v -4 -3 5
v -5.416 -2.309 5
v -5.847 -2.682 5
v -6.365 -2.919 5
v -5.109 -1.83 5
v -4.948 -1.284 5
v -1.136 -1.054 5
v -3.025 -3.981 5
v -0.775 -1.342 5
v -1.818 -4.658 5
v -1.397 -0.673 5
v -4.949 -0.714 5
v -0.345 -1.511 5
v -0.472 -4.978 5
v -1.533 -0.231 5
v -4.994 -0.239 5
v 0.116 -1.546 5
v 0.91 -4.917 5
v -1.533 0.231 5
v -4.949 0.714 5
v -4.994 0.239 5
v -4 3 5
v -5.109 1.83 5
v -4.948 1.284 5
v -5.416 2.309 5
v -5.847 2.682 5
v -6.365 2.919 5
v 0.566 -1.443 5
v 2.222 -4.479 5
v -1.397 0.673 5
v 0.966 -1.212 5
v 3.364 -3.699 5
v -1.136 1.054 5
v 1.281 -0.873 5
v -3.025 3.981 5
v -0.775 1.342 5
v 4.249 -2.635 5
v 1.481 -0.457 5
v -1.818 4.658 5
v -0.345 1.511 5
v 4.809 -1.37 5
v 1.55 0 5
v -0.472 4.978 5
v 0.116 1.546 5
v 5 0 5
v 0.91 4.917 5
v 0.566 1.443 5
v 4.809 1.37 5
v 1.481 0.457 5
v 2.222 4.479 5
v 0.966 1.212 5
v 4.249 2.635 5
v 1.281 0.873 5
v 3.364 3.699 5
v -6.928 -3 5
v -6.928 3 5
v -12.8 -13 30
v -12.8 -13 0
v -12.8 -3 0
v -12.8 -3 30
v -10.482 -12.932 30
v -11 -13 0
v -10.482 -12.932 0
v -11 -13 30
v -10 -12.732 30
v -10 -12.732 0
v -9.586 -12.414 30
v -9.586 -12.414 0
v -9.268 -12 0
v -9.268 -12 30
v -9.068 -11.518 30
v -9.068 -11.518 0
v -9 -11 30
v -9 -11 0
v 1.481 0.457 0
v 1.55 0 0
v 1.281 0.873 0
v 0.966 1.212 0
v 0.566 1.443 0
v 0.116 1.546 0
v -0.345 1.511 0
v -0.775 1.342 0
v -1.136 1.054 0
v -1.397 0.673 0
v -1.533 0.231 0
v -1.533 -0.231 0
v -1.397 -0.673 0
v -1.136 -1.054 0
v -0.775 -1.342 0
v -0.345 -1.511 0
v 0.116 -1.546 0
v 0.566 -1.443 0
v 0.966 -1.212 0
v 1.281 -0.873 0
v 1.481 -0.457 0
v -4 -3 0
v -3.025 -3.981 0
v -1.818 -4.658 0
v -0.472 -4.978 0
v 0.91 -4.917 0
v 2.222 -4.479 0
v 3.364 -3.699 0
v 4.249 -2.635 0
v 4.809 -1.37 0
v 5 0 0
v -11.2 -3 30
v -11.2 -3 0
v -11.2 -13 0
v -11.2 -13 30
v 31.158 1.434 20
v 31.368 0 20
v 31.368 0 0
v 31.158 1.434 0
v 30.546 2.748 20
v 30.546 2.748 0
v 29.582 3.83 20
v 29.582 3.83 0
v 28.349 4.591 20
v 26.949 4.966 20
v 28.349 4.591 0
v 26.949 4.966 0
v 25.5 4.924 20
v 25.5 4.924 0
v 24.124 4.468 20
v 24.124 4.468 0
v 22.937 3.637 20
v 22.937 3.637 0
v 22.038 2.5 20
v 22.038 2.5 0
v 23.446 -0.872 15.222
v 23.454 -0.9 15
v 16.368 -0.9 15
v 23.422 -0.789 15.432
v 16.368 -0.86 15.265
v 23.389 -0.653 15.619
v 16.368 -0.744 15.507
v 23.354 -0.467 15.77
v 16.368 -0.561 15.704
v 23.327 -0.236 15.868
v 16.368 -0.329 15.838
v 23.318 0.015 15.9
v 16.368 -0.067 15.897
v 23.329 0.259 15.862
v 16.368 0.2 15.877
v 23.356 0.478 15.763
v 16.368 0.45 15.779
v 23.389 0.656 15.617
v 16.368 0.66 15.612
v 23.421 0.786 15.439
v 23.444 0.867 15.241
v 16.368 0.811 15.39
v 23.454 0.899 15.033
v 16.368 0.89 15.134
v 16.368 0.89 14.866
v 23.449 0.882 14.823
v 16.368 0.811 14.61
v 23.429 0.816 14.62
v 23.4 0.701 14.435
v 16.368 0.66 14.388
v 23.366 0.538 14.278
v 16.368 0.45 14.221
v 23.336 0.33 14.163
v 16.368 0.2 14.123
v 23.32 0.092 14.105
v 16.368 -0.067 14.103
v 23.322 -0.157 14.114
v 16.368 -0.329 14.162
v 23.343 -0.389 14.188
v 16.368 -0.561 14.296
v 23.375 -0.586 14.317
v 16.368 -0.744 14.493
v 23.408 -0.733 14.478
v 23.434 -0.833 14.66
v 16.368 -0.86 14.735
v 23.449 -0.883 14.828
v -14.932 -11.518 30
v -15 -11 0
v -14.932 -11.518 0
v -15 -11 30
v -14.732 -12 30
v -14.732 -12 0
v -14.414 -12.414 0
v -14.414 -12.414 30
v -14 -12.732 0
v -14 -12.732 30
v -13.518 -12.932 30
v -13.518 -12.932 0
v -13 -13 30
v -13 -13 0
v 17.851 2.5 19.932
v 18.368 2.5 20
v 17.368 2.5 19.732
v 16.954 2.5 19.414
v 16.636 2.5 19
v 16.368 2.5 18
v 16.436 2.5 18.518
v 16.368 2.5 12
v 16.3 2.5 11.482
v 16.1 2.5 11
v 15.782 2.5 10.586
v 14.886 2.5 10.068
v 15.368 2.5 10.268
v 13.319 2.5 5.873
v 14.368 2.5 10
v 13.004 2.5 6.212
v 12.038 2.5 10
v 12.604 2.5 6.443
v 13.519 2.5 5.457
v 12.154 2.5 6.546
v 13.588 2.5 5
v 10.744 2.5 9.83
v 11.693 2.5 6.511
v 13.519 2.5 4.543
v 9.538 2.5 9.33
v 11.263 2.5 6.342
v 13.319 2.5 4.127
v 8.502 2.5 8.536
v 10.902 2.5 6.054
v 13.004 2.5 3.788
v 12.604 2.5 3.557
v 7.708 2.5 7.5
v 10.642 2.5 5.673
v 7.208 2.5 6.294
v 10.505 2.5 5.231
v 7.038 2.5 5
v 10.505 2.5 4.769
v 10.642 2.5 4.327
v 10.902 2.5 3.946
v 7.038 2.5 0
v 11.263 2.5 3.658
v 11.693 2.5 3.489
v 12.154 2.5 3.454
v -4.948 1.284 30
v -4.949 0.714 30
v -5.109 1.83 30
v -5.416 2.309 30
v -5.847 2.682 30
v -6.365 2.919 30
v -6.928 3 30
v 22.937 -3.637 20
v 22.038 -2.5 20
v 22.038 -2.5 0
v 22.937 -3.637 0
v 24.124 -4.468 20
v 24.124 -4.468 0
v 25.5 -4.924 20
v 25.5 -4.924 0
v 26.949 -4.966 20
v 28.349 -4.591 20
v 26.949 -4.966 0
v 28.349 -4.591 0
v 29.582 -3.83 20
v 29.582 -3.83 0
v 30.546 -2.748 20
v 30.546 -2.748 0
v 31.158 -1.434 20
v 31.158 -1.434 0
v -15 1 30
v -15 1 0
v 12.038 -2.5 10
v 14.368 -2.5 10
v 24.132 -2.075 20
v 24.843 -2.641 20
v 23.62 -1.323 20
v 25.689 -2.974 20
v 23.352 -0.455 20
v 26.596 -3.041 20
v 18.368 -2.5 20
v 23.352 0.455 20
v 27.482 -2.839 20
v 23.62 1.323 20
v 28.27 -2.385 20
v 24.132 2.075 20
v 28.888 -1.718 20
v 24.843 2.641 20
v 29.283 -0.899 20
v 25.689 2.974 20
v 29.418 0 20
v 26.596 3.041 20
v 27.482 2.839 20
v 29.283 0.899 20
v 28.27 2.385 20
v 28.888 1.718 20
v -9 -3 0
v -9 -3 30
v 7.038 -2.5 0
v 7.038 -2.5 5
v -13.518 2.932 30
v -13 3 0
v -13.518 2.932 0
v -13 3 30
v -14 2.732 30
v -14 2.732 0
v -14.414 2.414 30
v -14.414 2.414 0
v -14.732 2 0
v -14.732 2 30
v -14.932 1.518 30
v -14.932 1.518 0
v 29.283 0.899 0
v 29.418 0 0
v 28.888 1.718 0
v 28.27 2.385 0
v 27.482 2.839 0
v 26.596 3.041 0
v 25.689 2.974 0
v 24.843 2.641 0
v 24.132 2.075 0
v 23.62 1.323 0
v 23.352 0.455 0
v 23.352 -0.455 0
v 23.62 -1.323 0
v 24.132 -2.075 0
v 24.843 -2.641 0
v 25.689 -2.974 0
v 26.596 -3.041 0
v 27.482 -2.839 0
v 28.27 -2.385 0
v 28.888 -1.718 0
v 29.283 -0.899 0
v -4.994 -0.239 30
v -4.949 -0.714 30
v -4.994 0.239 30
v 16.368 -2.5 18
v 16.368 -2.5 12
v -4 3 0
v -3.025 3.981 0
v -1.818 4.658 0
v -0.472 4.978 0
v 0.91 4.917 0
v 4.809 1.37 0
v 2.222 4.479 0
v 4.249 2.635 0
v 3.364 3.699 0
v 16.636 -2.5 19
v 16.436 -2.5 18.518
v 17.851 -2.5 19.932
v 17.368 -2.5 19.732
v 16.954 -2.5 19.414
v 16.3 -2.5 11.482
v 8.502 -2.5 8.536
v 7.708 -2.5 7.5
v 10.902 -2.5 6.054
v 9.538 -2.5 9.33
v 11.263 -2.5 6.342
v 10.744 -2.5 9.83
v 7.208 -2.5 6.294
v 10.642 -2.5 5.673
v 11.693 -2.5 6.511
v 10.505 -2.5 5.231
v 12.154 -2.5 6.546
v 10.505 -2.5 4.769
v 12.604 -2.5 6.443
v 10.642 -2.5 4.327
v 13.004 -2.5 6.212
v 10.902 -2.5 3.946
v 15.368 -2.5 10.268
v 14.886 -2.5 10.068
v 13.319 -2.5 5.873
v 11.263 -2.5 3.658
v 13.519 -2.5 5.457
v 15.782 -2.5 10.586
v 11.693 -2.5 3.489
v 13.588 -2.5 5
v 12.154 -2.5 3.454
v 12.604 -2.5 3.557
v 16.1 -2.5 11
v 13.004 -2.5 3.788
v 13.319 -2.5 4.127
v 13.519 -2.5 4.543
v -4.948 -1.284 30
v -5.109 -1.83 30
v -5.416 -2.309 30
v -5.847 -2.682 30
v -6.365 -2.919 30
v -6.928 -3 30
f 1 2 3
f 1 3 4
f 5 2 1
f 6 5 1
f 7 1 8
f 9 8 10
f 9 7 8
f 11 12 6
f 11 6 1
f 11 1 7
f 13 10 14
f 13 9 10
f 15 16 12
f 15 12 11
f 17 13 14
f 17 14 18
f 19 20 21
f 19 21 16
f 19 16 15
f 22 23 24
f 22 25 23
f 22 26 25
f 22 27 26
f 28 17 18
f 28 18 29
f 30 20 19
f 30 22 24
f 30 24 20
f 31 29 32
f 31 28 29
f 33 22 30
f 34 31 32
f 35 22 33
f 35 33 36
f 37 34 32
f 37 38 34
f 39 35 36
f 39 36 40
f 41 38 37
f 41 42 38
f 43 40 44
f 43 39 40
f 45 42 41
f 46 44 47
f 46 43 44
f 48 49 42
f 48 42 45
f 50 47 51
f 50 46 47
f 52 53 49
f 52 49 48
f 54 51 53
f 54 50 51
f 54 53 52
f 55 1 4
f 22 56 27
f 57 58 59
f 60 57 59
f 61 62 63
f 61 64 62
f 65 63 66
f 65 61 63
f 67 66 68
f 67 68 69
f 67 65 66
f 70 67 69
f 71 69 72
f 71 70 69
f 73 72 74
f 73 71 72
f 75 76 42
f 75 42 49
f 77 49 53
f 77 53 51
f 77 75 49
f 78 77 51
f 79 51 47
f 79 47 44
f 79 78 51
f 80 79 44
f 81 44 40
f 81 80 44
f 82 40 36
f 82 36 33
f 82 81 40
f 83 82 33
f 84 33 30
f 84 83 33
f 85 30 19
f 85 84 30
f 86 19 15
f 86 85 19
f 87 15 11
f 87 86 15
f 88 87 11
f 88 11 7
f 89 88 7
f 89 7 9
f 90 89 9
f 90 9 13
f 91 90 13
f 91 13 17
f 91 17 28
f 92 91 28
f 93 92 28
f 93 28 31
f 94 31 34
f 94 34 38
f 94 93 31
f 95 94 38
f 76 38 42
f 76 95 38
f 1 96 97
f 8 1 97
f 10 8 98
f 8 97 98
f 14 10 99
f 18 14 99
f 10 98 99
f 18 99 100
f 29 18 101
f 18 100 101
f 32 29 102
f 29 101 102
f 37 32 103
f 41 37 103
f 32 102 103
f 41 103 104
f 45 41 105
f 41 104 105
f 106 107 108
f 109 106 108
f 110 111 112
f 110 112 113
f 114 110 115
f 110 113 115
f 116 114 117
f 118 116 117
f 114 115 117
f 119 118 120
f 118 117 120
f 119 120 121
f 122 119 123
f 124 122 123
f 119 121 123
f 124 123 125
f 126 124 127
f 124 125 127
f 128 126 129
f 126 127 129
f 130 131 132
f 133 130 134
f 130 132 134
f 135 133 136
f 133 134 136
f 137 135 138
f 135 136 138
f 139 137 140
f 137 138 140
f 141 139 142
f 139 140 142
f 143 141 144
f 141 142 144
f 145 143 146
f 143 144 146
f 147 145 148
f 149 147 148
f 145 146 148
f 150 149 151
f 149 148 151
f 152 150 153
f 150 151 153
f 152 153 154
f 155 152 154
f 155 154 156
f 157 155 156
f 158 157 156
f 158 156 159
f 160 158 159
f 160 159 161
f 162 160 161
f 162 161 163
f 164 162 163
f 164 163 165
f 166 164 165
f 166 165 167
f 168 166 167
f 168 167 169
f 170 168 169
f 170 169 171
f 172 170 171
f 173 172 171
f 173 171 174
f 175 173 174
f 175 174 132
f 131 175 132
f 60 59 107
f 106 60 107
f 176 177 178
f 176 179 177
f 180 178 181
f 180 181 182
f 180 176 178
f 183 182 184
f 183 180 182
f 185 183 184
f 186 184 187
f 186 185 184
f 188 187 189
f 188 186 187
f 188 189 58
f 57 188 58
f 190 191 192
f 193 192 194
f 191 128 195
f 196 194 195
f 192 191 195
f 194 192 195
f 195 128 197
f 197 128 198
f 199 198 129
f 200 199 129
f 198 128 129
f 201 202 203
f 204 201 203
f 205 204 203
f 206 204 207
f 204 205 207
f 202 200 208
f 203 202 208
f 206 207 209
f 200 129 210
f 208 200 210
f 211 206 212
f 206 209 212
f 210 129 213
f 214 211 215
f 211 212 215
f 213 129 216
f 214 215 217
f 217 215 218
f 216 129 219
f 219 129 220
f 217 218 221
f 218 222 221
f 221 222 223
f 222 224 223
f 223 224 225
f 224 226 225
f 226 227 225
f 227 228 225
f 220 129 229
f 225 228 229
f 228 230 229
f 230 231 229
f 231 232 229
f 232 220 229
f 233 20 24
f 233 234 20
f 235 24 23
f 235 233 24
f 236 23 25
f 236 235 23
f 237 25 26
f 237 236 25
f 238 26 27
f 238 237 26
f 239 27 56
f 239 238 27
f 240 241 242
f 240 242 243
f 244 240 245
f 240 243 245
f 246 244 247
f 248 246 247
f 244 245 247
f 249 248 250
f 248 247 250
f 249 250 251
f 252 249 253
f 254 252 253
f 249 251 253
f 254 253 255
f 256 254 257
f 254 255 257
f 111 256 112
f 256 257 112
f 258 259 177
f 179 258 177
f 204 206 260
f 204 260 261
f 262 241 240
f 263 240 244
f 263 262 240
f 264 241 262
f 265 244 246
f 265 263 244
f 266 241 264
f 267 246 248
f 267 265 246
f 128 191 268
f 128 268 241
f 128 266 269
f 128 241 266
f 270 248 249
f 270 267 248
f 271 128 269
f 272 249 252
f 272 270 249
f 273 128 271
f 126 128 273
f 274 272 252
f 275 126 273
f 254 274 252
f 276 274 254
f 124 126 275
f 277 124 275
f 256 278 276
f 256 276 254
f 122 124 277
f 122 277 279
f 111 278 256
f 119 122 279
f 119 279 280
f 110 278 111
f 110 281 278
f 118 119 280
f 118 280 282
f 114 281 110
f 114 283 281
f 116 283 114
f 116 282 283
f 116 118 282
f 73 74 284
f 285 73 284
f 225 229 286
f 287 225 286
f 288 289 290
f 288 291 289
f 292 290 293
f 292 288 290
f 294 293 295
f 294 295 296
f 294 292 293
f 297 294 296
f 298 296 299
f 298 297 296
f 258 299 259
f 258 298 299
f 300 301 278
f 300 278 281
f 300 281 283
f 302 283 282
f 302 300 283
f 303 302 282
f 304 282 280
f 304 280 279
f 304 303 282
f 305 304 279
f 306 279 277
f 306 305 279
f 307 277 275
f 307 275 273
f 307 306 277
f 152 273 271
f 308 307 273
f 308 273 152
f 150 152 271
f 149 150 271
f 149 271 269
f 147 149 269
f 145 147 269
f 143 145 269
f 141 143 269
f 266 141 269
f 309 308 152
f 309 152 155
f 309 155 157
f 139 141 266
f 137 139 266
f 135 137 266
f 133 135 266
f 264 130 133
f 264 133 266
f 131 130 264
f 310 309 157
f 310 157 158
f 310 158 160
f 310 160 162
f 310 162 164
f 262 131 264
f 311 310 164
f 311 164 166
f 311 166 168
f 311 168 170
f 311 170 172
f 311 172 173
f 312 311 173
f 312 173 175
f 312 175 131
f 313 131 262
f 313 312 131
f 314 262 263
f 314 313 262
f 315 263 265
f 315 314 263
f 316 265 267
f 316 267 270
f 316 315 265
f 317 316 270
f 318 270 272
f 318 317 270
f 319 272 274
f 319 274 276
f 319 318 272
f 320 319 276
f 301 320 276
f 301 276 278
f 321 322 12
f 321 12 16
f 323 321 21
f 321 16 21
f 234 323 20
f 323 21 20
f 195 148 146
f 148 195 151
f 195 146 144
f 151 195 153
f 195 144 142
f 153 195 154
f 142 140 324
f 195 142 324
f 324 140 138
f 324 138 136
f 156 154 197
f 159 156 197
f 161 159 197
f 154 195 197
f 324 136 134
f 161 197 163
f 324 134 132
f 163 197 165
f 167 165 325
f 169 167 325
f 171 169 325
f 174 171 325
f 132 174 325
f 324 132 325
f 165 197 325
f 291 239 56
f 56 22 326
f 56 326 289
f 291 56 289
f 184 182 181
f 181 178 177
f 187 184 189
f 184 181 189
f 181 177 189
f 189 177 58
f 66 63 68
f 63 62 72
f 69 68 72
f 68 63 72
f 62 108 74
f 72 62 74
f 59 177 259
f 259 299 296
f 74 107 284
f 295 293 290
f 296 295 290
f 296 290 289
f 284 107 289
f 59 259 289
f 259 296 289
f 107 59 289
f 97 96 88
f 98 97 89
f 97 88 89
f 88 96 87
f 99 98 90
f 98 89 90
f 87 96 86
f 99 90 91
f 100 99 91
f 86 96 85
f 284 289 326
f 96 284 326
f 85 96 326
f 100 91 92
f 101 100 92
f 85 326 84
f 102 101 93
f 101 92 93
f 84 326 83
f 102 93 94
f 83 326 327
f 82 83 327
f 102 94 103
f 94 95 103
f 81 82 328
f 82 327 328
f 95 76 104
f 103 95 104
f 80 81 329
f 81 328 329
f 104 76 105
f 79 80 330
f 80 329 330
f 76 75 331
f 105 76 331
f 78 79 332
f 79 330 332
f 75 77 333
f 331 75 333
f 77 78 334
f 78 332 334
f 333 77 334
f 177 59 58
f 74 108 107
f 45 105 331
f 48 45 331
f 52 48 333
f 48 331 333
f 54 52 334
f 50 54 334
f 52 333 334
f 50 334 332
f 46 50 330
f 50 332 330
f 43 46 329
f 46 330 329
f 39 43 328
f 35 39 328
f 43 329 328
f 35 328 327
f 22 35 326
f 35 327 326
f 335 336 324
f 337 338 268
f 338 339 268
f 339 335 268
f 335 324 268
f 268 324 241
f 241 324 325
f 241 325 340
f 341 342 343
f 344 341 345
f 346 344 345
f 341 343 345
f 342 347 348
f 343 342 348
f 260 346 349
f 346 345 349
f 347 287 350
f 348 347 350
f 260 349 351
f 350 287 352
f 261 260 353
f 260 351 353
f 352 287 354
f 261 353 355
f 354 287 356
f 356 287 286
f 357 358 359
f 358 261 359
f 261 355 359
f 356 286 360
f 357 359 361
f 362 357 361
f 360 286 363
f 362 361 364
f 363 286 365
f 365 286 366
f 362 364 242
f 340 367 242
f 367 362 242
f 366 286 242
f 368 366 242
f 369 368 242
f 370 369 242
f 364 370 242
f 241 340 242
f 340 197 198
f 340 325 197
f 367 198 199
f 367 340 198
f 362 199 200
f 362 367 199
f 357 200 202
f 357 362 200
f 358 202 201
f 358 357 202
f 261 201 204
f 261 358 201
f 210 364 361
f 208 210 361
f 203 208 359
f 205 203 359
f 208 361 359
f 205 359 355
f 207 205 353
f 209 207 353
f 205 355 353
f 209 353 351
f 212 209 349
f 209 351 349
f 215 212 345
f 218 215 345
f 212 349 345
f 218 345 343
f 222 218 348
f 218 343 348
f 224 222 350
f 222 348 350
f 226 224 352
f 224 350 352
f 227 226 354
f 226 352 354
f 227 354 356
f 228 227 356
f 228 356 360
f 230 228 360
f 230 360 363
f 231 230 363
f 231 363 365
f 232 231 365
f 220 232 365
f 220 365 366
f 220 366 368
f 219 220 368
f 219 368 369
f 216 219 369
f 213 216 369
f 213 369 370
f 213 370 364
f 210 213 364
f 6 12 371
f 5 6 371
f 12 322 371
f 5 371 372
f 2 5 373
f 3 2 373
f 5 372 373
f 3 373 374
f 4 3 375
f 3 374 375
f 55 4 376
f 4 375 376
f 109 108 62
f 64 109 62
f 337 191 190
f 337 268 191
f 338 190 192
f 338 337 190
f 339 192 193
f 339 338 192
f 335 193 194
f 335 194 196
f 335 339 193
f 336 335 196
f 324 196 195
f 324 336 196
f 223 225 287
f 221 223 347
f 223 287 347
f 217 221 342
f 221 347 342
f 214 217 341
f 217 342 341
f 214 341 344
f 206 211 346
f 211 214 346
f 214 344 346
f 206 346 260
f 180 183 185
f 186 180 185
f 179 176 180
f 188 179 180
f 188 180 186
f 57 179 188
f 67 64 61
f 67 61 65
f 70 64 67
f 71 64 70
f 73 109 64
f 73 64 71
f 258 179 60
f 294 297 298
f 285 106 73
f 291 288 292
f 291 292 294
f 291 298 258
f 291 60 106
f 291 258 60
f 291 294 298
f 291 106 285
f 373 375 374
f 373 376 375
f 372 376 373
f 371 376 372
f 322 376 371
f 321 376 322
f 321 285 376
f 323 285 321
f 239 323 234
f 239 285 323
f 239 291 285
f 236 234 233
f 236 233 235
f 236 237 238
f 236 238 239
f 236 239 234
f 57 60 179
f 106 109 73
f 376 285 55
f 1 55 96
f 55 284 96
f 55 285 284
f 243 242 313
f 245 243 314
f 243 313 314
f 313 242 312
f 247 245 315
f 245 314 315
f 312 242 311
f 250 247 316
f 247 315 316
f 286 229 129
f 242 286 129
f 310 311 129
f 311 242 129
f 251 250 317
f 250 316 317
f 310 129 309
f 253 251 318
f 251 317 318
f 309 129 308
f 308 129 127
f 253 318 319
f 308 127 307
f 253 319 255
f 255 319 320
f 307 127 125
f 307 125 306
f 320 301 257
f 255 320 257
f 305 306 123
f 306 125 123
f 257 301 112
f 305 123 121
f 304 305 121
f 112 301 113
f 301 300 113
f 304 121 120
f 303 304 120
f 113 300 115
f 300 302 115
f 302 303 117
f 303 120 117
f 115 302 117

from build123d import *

# Parameters (mm, degrees)
F0_R      = 1.55
F1_DEPTH  = 5
F2_DEPTH  = 30
F3_R      = 2
F4_R      = 3.05
F5_DEPTH  = 20
F6_DEPTH  = 10
F7_R      = 1.55
F8_DEPTH  = 25
F10_DEPTH = 10
F11_R     = 0.9
F12_DEPTH = 10
F13_R     = 2


with BuildPart() as f1:
    # F0 (on Top) → F1 (new body)
    with BuildSketch(Plane.XY):
        with BuildLine():
            ThreePointArc((-4, -3), (1.5811388301, -4.7434164903), (5, 0))
            ThreePointArc((5, 0), (1.5811388301, 4.7434164903), (-4, 3))
            ThreePointArc((-4, 3), (-5, 0), (-4, -3))
        make_face()
        Circle(F0_R, mode=Mode.SUBTRACT)
    extrude(amount=F1_DEPTH)

    # F0 (on Top) → F2 (join)
    with BuildSketch(Plane.XY):
        with BuildLine():
            ThreePointArc((-4, -3), (-5, 0), (-4, 3))
            Line((-4, 3), (-15, 3))
            Line((-15, 3), (-15, -13))
            Line((-15, -13), (-12.8, -13))
            Line((-12.8, -13), (-12.8, -3))
            Line((-12.8, -3), (-11.2, -3))
            Line((-11.2, -3), (-11.2, -13))
            Line((-11.2, -13), (-9, -13))
            Line((-9, -13), (-9, -3))
            Line((-9, -3), (-4, -3))
        make_face()
    extrude(amount=F2_DEPTH)

    # F3
    f3_edges = [f1.edges().sort_by_distance(p)[0] for p in [
        (-4, 3, 17.5),
        (-4, -3, 17.5),
        (-15, 3, 15),
        (-9, -13, 15),
        (-15, -13, 15),
    ]]
    fillet(f3_edges, radius=F3_R)


with BuildPart() as f5:
    # F4 (on Top) → F5 (new body)
    with BuildSketch(Plane.XY):
        with BuildLine():
            ThreePointArc((22.0380171016, -2.5), (27.662239346, -4.8296291314), (31.3681441205, 0))
            ThreePointArc((31.3681441205, 0), (27.662239346, 4.8296291314), (22.0380171016, 2.5))
            ThreePointArc((22.0380171016, 2.5), (21.3681441205, 0), (22.0380171016, -2.5))
        make_face()
        with Locations((26.3681441205, 0)):
            Circle(F4_R, mode=Mode.SUBTRACT)
    extrude(amount=F5_DEPTH)

    # F4 (on Top) → F6 (join)
    with BuildSketch(Plane.XY):
        with BuildLine():
            ThreePointArc((22.0380171016, -2.5), (21.3681441205, 0), (22.0380171016, 2.5))
            Line((22.0380171016, 2.5), (7.0380171016, 2.5))
            Line((7.0380171016, 2.5), (7.0380171016, -2.5))
            Line((7.0380171016, -2.5), (22.0380171016, -2.5))
        make_face()
    extrude(amount=F6_DEPTH)

    # F7 (on face) → F8 (cut)
    with BuildSketch(Plane.XZ.offset(2.5)):
        with BuildLine():
            ThreePointArc((7.0380171016, 5), (8.5024831957, 8.5355339059), (12.0380171016, 10))
            Line((12.0380171016, 10), (7.0380171016, 10))
            Line((7.0380171016, 10), (7.0380171016, 5))
        make_face()
        with Locations((12.0380171016, 5)):
            Circle(F7_R)
    extrude(amount=-F8_DEPTH, mode=Mode.SUBTRACT)

    # F9 (on face) → F10 (join)
    with BuildSketch(Plane.XY.offset(10)):
        with BuildLine():
            Line((22.0380171016, 2.5), (16.3681441205, 2.5))
            Line((16.3681441205, 2.5), (16.3681441205, -2.5))
            Line((16.3681441205, -2.5), (22.0380171016, -2.5))
            ThreePointArc((22.0380171016, -2.5), (21.3681441205, 0), (22.0380171016, 2.5))
        make_face()
    extrude(amount=F10_DEPTH)

    # F11 (on face) → F12 (cut)
    with BuildSketch(Plane(origin=(16.3681441205, 0, 0), x_dir=(0, -1, 0), z_dir=(-1, 0, 0))):
        with Locations((0, 15)):
            Circle(F11_R)
    extrude(amount=-F12_DEPTH, mode=Mode.SUBTRACT)

    # F13
    f13_edges = [f5.edges().sort_by_distance(p)[0] for p in [
        (16.368144, 0, 20),
        (16.368144, 0, 10),
    ]]
    fillet(f13_edges, radius=F13_R)


solid = Compound([f1.part, f5.part])
